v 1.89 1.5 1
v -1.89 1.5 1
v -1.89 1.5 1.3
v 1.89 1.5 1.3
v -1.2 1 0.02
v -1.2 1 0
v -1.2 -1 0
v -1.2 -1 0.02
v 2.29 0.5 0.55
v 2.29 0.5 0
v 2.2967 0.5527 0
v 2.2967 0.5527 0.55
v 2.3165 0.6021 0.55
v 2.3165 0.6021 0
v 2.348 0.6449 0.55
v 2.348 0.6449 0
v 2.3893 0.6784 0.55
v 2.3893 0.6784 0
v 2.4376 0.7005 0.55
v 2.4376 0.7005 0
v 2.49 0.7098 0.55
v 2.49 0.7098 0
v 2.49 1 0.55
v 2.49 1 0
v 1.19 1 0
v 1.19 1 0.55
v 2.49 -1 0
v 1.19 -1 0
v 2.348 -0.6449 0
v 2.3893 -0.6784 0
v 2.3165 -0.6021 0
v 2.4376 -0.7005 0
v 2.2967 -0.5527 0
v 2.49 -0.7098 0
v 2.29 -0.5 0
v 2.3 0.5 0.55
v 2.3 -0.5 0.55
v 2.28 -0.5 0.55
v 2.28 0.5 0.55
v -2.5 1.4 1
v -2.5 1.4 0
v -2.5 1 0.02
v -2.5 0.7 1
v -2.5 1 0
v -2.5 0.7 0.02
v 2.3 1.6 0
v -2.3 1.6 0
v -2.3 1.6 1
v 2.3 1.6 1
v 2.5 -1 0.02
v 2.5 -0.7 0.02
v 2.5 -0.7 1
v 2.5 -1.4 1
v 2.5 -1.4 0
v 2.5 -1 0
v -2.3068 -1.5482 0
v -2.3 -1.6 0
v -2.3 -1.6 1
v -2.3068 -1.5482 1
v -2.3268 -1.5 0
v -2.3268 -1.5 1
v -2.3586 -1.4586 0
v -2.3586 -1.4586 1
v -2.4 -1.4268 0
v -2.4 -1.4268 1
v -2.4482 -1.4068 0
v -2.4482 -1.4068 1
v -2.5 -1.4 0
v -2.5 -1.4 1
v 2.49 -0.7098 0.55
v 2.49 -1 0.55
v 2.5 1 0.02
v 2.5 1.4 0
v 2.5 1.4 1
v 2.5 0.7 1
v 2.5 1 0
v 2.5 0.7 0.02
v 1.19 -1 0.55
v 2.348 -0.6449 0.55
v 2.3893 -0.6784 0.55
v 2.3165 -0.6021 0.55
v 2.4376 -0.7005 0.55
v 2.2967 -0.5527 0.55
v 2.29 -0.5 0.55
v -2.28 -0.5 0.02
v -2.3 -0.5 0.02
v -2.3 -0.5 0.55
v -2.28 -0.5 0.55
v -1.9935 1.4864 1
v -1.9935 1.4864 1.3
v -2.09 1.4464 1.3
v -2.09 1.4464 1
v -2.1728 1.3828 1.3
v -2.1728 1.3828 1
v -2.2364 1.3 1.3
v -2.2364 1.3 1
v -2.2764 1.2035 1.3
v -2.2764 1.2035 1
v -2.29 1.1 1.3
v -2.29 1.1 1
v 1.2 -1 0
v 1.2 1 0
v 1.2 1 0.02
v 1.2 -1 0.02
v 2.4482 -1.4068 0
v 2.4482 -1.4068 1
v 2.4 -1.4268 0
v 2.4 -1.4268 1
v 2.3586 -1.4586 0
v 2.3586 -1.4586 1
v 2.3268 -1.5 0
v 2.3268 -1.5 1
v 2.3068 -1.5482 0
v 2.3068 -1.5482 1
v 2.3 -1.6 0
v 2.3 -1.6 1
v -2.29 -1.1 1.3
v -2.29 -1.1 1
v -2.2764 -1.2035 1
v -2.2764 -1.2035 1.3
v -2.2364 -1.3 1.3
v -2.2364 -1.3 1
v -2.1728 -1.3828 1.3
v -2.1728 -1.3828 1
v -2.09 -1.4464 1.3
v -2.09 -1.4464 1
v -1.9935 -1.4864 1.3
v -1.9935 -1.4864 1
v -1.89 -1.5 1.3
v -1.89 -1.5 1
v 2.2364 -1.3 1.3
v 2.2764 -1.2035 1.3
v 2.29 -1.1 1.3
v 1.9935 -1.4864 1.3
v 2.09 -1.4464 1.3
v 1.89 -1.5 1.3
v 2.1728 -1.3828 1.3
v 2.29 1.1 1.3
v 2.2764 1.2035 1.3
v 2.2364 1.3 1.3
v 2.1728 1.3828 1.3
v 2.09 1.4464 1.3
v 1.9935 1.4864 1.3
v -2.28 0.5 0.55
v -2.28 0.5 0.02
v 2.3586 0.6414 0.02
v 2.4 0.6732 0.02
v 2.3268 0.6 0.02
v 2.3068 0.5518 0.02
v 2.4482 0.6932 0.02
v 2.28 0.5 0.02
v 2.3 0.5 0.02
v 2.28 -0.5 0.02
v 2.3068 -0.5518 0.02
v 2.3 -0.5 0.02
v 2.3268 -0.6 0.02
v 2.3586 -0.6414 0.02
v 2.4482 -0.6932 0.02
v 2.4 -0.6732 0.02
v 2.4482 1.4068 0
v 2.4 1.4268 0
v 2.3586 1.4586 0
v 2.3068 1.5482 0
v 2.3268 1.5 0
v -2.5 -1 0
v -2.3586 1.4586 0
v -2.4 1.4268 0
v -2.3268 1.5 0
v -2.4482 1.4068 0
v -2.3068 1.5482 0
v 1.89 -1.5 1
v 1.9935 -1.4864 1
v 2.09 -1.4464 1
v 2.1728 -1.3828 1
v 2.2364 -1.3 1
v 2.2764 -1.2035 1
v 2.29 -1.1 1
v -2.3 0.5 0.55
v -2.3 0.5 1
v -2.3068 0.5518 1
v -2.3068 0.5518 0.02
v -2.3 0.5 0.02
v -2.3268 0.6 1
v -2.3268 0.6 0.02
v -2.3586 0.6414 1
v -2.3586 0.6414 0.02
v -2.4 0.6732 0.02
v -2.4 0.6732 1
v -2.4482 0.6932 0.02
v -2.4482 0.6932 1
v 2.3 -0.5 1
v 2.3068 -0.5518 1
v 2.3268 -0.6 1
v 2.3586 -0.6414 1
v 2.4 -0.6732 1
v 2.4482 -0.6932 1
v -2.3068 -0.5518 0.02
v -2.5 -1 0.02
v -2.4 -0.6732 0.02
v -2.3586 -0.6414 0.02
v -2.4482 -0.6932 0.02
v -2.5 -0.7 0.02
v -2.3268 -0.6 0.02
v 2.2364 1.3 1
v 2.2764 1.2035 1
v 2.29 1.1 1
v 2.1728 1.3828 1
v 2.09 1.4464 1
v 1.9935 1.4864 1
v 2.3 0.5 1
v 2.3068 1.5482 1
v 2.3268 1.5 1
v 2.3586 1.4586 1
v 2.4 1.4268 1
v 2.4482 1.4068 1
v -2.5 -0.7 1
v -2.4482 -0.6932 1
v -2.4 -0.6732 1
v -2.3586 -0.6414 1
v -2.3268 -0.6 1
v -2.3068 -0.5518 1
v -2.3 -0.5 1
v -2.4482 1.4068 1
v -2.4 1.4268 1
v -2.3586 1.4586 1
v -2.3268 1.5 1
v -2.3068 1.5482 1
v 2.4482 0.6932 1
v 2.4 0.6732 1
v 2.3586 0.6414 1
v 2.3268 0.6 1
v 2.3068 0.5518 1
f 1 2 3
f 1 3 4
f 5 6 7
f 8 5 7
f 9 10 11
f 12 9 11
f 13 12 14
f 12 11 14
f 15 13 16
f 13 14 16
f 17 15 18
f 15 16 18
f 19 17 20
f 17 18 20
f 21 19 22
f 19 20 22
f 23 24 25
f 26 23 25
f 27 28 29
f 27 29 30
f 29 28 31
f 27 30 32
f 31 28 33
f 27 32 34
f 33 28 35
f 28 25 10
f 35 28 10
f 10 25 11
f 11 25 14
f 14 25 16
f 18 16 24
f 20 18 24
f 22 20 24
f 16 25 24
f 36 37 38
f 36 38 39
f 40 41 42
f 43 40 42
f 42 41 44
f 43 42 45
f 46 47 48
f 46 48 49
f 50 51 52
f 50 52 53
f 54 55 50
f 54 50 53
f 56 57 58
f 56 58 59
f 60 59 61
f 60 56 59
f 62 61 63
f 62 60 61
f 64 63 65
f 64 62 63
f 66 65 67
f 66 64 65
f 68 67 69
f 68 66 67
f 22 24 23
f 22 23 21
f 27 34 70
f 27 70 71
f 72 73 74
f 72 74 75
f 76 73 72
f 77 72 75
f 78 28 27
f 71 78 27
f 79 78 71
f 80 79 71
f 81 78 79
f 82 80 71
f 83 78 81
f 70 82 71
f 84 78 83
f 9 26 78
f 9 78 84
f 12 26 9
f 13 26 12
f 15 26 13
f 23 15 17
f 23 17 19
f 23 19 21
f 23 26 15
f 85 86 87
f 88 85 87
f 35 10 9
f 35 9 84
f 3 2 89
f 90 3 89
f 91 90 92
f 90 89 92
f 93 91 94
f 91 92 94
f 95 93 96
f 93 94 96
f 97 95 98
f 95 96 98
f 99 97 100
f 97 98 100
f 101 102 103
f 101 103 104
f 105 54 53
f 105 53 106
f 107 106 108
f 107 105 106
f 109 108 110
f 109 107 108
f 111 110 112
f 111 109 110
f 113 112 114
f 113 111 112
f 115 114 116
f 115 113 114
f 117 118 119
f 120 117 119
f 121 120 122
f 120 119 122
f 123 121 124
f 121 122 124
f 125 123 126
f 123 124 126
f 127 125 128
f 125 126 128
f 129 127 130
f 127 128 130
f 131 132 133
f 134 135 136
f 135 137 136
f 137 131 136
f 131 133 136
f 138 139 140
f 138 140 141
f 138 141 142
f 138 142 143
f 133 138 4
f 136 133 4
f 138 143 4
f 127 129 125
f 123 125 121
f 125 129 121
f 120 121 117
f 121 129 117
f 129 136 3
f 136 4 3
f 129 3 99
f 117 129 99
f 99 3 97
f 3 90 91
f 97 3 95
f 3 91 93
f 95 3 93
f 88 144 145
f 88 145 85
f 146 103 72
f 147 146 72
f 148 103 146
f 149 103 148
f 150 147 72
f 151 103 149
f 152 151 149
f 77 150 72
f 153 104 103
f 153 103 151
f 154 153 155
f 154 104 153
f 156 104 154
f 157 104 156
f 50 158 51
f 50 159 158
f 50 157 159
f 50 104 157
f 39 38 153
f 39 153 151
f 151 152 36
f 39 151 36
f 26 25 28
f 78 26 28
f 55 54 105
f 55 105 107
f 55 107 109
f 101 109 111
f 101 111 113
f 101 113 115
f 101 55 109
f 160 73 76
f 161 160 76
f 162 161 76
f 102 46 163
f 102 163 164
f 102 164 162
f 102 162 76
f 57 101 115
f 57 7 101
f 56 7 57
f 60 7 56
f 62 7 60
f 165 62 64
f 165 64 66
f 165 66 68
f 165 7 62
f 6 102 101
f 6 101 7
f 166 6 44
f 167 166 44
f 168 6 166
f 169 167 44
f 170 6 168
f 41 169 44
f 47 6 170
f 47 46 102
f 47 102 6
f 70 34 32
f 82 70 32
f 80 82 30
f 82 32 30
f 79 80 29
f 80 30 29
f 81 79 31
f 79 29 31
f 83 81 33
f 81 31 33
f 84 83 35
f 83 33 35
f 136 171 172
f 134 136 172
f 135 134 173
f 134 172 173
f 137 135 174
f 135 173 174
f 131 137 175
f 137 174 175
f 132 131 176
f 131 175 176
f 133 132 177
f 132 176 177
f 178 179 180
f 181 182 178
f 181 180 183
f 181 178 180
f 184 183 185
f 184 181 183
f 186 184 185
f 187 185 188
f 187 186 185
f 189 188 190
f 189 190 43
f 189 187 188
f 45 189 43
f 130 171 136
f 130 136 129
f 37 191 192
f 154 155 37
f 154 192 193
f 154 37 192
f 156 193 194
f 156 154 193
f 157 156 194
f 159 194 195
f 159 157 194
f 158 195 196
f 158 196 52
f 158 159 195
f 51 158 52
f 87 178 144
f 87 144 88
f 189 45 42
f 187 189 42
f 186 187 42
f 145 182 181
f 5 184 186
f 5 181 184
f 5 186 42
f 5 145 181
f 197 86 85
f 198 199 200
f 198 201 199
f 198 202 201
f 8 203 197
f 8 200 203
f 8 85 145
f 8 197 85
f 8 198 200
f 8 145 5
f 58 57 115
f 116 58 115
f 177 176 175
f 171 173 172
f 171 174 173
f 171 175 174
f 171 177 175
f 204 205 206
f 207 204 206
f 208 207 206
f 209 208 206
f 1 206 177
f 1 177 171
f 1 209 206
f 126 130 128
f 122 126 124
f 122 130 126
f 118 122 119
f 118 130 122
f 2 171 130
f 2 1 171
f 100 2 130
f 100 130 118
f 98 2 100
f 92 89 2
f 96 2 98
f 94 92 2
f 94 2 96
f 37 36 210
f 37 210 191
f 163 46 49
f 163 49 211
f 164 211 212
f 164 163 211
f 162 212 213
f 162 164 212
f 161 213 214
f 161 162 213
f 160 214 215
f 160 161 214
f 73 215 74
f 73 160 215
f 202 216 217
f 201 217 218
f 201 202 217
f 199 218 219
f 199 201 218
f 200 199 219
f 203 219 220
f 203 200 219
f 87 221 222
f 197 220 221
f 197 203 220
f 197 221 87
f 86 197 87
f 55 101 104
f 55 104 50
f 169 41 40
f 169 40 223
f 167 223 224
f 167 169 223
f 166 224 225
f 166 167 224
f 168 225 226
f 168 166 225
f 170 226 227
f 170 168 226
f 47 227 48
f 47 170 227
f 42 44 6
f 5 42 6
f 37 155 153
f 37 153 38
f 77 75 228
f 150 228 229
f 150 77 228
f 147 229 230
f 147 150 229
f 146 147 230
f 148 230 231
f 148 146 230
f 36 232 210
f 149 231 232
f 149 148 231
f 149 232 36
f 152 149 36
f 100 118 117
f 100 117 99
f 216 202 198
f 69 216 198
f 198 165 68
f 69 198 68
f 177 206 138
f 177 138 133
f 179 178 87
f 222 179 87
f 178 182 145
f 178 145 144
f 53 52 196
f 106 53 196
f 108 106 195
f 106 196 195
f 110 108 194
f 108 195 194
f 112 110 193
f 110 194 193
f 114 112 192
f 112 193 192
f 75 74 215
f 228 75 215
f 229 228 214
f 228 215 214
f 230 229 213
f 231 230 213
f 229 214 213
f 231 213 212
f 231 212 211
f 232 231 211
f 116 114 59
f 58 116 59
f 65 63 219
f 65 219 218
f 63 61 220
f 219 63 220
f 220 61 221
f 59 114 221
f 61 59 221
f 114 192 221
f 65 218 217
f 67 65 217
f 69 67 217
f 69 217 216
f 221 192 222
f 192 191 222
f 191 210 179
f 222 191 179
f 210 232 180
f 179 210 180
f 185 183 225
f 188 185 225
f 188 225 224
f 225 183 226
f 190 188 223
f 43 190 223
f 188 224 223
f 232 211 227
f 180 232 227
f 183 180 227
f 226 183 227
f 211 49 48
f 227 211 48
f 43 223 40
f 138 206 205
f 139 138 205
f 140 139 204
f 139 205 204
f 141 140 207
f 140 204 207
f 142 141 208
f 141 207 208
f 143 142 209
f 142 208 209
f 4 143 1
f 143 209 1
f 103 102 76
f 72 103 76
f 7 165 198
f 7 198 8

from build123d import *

# Parameters (mm, degrees)
PAD_DEPTH               = 1
SKETCH004_W             = 1
SKETCH004_H             = 0.55
POCKET_DEPTH            = 0.02
SKETCH005_W             = 1.3
SKETCH005_H             = 2
POCKET001_DEPTH         = 0.02
SKETCH006_W             = 1
SKETCH006_H             = 0.55
POCKET002_DEPTH         = 0.02
SKETCH007_W             = 1.3
SKETCH007_H             = 2
POCKET003_DEPTH         = 0.02
PAD002_DEPTH            = 0.55
PAD003_DEPTH            = 0.55
BODY002_PLACEMENT_ANGLE = 180
PAD004_DEPTH            = 0.3


with BuildPart() as body:
    # Sketch → Pad (new body)
    with BuildSketch(Plane.XY):
        with BuildLine():
            Line((-2.3, 1.6), (2.3, 1.6))
            ThreePointArc((2.3, 1.6), (2.358579, 1.458579), (2.5, 1.4))
            Line((2.5, 1.4), (2.5, 0.7))
            ThreePointArc((2.5, 0.7), (2.358579, 0.641421), (2.3, 0.5))
            Line((2.3, 0.5), (2.3, -0.5))
            ThreePointArc((2.3, -0.5), (2.358579, -0.641421), (2.5, -0.7))
            Line((2.5, -0.7), (2.5, -1.4))
            ThreePointArc((2.5, -1.4), (2.358579, -1.458579), (2.3, -1.6))
            Line((-2.3, -1.6), (2.3, -1.6))
            ThreePointArc((-2.3, -1.6), (-2.358579, -1.458579), (-2.5, -1.4))
            Line((-2.5, -0.7), (-2.5, -1.4))
            ThreePointArc((-2.5, -0.7), (-2.358579, -0.641421), (-2.3, -0.5))
            Line((-2.3, 0.5), (-2.3, -0.5))
            ThreePointArc((-2.3, 0.5), (-2.358579, 0.641421), (-2.5, 0.7))
            Line((-2.5, 1.4), (-2.5, 0.7))
            ThreePointArc((-2.5, 1.4), (-2.358579, 1.458579), (-2.3, 1.6))
        make_face()
    extrude(amount=PAD_DEPTH)

    # Sketch004 → Pocket (cut)
    with BuildSketch(Plane(origin=(-2.3, 0, 0), x_dir=(0, -1, 0), z_dir=(-1, 0, 0))):
        with Locations((0, 0.275)):
            Rectangle(SKETCH004_W, SKETCH004_H)
    extrude(amount=-POCKET_DEPTH, mode=Mode.SUBTRACT)

    # Sketch005 (on Face4 of Pocket) → Pocket001 (cut)
    with BuildSketch(Plane(origin=(0, 0, 0), x_dir=(1, 0, 0), z_dir=(0, 0, -1))):
        with Locations((-1.85, 0)):
            Rectangle(SKETCH005_W, SKETCH005_H)
    extrude(amount=-POCKET001_DEPTH, mode=Mode.SUBTRACT)

    # Sketch006 (on Face18 of Pocket001) → Pocket002 (cut)
    with BuildSketch(Plane.YZ.offset(2.3)):
        with Locations((0, 0.275)):
            Rectangle(SKETCH006_W, SKETCH006_H)
    extrude(amount=-POCKET002_DEPTH, mode=Mode.SUBTRACT)

    # Sketch007 (on Face4 of Pocket002) → Pocket003 (cut)
    with BuildSketch(Plane(origin=(0, 0, 0), x_dir=(1, 0, 0), z_dir=(0, 0, -1))):
        with Locations((1.85, 0)):
            Rectangle(SKETCH007_W, SKETCH007_H)
    extrude(amount=-POCKET003_DEPTH, mode=Mode.SUBTRACT)


with BuildPart() as padright:
    # Sketch003 (on ShapeBinder) → Pad002 (new body)
    with BuildSketch(Plane(origin=(0, 0, 0), x_dir=(1, 0, 0), z_dir=(0, 0, -1))):
        with BuildLine():
            Line((-2.49, 1), (-1.19, 1))
            Line((-1.19, 1), (-1.19, -1))
            Line((-1.19, -1), (-2.49, -1))
            Line((-2.49, -0.709762), (-2.49, -1))
            ThreePointArc((-2.49, -0.709762), (-2.348013, -0.644914), (-2.29, -0.5))
            Line((-2.29, 0.5), (-2.29, -0.5))
            ThreePointArc((-2.29, 0.5), (-2.348013, 0.644914), (-2.49, 0.709762))
            Line((-2.49, 1), (-2.49, 0.709762))
        make_face()
    extrude(amount=-PAD002_DEPTH)

    # Sketch003 (on ShapeBinder) → Pad003 (join)
    with BuildSketch(Plane(origin=(0, 0, 0), x_dir=(1, 0, 0), z_dir=(0, 0, -1))):
        with BuildLine():
            Line((-2.49, 1), (-1.19, 1))
            Line((-1.19, 1), (-1.19, -1))
            Line((-1.19, -1), (-2.49, -1))
            Line((-2.49, -0.709762), (-2.49, -1))
            ThreePointArc((-2.49, -0.709762), (-2.348013, -0.644914), (-2.29, -0.5))
            Line((-2.29, 0.5), (-2.29, -0.5))
            ThreePointArc((-2.29, 0.5), (-2.348013, 0.644914), (-2.49, 0.709762))
            Line((-2.49, 1), (-2.49, 0.709762))
        make_face()
    extrude(amount=-PAD003_DEPTH)


with BuildPart() as padright_1:
    # Body002 placement: moved
    add(padright.part.moved(Location((0, 0, 0))).rotate(Axis((0, 0, 0), (0, 0, 1)), BODY002_PLACEMENT_ANGLE))


with BuildPart() as top:
    # Sketch008 (on ShapeBinder) → Pad004 (new body)
    with BuildSketch(Plane.XY.offset(1)):
        with BuildLine():
            Line((-1.89, 1.5), (1.89, 1.5))
            ThreePointArc((2.29, 1.1), (2.172843, 1.382843), (1.89, 1.5))
            Line((2.29, 1.1), (2.29, -1.1))
            ThreePointArc((1.89, -1.5), (2.172843, -1.382843), (2.29, -1.1))
            Line((1.89, -1.5), (-1.89, -1.5))
            ThreePointArc((-2.29, -1.1), (-2.172843, -1.382843), (-1.89, -1.5))
            Line((-2.29, -1.1), (-2.29, 1.1))
            ThreePointArc((-1.89, 1.5), (-2.172843, 1.382843), (-2.29, 1.1))
        make_face()
    extrude(amount=PAD004_DEPTH)


solid = Compound([body.part, padright_1.part, top.part])
